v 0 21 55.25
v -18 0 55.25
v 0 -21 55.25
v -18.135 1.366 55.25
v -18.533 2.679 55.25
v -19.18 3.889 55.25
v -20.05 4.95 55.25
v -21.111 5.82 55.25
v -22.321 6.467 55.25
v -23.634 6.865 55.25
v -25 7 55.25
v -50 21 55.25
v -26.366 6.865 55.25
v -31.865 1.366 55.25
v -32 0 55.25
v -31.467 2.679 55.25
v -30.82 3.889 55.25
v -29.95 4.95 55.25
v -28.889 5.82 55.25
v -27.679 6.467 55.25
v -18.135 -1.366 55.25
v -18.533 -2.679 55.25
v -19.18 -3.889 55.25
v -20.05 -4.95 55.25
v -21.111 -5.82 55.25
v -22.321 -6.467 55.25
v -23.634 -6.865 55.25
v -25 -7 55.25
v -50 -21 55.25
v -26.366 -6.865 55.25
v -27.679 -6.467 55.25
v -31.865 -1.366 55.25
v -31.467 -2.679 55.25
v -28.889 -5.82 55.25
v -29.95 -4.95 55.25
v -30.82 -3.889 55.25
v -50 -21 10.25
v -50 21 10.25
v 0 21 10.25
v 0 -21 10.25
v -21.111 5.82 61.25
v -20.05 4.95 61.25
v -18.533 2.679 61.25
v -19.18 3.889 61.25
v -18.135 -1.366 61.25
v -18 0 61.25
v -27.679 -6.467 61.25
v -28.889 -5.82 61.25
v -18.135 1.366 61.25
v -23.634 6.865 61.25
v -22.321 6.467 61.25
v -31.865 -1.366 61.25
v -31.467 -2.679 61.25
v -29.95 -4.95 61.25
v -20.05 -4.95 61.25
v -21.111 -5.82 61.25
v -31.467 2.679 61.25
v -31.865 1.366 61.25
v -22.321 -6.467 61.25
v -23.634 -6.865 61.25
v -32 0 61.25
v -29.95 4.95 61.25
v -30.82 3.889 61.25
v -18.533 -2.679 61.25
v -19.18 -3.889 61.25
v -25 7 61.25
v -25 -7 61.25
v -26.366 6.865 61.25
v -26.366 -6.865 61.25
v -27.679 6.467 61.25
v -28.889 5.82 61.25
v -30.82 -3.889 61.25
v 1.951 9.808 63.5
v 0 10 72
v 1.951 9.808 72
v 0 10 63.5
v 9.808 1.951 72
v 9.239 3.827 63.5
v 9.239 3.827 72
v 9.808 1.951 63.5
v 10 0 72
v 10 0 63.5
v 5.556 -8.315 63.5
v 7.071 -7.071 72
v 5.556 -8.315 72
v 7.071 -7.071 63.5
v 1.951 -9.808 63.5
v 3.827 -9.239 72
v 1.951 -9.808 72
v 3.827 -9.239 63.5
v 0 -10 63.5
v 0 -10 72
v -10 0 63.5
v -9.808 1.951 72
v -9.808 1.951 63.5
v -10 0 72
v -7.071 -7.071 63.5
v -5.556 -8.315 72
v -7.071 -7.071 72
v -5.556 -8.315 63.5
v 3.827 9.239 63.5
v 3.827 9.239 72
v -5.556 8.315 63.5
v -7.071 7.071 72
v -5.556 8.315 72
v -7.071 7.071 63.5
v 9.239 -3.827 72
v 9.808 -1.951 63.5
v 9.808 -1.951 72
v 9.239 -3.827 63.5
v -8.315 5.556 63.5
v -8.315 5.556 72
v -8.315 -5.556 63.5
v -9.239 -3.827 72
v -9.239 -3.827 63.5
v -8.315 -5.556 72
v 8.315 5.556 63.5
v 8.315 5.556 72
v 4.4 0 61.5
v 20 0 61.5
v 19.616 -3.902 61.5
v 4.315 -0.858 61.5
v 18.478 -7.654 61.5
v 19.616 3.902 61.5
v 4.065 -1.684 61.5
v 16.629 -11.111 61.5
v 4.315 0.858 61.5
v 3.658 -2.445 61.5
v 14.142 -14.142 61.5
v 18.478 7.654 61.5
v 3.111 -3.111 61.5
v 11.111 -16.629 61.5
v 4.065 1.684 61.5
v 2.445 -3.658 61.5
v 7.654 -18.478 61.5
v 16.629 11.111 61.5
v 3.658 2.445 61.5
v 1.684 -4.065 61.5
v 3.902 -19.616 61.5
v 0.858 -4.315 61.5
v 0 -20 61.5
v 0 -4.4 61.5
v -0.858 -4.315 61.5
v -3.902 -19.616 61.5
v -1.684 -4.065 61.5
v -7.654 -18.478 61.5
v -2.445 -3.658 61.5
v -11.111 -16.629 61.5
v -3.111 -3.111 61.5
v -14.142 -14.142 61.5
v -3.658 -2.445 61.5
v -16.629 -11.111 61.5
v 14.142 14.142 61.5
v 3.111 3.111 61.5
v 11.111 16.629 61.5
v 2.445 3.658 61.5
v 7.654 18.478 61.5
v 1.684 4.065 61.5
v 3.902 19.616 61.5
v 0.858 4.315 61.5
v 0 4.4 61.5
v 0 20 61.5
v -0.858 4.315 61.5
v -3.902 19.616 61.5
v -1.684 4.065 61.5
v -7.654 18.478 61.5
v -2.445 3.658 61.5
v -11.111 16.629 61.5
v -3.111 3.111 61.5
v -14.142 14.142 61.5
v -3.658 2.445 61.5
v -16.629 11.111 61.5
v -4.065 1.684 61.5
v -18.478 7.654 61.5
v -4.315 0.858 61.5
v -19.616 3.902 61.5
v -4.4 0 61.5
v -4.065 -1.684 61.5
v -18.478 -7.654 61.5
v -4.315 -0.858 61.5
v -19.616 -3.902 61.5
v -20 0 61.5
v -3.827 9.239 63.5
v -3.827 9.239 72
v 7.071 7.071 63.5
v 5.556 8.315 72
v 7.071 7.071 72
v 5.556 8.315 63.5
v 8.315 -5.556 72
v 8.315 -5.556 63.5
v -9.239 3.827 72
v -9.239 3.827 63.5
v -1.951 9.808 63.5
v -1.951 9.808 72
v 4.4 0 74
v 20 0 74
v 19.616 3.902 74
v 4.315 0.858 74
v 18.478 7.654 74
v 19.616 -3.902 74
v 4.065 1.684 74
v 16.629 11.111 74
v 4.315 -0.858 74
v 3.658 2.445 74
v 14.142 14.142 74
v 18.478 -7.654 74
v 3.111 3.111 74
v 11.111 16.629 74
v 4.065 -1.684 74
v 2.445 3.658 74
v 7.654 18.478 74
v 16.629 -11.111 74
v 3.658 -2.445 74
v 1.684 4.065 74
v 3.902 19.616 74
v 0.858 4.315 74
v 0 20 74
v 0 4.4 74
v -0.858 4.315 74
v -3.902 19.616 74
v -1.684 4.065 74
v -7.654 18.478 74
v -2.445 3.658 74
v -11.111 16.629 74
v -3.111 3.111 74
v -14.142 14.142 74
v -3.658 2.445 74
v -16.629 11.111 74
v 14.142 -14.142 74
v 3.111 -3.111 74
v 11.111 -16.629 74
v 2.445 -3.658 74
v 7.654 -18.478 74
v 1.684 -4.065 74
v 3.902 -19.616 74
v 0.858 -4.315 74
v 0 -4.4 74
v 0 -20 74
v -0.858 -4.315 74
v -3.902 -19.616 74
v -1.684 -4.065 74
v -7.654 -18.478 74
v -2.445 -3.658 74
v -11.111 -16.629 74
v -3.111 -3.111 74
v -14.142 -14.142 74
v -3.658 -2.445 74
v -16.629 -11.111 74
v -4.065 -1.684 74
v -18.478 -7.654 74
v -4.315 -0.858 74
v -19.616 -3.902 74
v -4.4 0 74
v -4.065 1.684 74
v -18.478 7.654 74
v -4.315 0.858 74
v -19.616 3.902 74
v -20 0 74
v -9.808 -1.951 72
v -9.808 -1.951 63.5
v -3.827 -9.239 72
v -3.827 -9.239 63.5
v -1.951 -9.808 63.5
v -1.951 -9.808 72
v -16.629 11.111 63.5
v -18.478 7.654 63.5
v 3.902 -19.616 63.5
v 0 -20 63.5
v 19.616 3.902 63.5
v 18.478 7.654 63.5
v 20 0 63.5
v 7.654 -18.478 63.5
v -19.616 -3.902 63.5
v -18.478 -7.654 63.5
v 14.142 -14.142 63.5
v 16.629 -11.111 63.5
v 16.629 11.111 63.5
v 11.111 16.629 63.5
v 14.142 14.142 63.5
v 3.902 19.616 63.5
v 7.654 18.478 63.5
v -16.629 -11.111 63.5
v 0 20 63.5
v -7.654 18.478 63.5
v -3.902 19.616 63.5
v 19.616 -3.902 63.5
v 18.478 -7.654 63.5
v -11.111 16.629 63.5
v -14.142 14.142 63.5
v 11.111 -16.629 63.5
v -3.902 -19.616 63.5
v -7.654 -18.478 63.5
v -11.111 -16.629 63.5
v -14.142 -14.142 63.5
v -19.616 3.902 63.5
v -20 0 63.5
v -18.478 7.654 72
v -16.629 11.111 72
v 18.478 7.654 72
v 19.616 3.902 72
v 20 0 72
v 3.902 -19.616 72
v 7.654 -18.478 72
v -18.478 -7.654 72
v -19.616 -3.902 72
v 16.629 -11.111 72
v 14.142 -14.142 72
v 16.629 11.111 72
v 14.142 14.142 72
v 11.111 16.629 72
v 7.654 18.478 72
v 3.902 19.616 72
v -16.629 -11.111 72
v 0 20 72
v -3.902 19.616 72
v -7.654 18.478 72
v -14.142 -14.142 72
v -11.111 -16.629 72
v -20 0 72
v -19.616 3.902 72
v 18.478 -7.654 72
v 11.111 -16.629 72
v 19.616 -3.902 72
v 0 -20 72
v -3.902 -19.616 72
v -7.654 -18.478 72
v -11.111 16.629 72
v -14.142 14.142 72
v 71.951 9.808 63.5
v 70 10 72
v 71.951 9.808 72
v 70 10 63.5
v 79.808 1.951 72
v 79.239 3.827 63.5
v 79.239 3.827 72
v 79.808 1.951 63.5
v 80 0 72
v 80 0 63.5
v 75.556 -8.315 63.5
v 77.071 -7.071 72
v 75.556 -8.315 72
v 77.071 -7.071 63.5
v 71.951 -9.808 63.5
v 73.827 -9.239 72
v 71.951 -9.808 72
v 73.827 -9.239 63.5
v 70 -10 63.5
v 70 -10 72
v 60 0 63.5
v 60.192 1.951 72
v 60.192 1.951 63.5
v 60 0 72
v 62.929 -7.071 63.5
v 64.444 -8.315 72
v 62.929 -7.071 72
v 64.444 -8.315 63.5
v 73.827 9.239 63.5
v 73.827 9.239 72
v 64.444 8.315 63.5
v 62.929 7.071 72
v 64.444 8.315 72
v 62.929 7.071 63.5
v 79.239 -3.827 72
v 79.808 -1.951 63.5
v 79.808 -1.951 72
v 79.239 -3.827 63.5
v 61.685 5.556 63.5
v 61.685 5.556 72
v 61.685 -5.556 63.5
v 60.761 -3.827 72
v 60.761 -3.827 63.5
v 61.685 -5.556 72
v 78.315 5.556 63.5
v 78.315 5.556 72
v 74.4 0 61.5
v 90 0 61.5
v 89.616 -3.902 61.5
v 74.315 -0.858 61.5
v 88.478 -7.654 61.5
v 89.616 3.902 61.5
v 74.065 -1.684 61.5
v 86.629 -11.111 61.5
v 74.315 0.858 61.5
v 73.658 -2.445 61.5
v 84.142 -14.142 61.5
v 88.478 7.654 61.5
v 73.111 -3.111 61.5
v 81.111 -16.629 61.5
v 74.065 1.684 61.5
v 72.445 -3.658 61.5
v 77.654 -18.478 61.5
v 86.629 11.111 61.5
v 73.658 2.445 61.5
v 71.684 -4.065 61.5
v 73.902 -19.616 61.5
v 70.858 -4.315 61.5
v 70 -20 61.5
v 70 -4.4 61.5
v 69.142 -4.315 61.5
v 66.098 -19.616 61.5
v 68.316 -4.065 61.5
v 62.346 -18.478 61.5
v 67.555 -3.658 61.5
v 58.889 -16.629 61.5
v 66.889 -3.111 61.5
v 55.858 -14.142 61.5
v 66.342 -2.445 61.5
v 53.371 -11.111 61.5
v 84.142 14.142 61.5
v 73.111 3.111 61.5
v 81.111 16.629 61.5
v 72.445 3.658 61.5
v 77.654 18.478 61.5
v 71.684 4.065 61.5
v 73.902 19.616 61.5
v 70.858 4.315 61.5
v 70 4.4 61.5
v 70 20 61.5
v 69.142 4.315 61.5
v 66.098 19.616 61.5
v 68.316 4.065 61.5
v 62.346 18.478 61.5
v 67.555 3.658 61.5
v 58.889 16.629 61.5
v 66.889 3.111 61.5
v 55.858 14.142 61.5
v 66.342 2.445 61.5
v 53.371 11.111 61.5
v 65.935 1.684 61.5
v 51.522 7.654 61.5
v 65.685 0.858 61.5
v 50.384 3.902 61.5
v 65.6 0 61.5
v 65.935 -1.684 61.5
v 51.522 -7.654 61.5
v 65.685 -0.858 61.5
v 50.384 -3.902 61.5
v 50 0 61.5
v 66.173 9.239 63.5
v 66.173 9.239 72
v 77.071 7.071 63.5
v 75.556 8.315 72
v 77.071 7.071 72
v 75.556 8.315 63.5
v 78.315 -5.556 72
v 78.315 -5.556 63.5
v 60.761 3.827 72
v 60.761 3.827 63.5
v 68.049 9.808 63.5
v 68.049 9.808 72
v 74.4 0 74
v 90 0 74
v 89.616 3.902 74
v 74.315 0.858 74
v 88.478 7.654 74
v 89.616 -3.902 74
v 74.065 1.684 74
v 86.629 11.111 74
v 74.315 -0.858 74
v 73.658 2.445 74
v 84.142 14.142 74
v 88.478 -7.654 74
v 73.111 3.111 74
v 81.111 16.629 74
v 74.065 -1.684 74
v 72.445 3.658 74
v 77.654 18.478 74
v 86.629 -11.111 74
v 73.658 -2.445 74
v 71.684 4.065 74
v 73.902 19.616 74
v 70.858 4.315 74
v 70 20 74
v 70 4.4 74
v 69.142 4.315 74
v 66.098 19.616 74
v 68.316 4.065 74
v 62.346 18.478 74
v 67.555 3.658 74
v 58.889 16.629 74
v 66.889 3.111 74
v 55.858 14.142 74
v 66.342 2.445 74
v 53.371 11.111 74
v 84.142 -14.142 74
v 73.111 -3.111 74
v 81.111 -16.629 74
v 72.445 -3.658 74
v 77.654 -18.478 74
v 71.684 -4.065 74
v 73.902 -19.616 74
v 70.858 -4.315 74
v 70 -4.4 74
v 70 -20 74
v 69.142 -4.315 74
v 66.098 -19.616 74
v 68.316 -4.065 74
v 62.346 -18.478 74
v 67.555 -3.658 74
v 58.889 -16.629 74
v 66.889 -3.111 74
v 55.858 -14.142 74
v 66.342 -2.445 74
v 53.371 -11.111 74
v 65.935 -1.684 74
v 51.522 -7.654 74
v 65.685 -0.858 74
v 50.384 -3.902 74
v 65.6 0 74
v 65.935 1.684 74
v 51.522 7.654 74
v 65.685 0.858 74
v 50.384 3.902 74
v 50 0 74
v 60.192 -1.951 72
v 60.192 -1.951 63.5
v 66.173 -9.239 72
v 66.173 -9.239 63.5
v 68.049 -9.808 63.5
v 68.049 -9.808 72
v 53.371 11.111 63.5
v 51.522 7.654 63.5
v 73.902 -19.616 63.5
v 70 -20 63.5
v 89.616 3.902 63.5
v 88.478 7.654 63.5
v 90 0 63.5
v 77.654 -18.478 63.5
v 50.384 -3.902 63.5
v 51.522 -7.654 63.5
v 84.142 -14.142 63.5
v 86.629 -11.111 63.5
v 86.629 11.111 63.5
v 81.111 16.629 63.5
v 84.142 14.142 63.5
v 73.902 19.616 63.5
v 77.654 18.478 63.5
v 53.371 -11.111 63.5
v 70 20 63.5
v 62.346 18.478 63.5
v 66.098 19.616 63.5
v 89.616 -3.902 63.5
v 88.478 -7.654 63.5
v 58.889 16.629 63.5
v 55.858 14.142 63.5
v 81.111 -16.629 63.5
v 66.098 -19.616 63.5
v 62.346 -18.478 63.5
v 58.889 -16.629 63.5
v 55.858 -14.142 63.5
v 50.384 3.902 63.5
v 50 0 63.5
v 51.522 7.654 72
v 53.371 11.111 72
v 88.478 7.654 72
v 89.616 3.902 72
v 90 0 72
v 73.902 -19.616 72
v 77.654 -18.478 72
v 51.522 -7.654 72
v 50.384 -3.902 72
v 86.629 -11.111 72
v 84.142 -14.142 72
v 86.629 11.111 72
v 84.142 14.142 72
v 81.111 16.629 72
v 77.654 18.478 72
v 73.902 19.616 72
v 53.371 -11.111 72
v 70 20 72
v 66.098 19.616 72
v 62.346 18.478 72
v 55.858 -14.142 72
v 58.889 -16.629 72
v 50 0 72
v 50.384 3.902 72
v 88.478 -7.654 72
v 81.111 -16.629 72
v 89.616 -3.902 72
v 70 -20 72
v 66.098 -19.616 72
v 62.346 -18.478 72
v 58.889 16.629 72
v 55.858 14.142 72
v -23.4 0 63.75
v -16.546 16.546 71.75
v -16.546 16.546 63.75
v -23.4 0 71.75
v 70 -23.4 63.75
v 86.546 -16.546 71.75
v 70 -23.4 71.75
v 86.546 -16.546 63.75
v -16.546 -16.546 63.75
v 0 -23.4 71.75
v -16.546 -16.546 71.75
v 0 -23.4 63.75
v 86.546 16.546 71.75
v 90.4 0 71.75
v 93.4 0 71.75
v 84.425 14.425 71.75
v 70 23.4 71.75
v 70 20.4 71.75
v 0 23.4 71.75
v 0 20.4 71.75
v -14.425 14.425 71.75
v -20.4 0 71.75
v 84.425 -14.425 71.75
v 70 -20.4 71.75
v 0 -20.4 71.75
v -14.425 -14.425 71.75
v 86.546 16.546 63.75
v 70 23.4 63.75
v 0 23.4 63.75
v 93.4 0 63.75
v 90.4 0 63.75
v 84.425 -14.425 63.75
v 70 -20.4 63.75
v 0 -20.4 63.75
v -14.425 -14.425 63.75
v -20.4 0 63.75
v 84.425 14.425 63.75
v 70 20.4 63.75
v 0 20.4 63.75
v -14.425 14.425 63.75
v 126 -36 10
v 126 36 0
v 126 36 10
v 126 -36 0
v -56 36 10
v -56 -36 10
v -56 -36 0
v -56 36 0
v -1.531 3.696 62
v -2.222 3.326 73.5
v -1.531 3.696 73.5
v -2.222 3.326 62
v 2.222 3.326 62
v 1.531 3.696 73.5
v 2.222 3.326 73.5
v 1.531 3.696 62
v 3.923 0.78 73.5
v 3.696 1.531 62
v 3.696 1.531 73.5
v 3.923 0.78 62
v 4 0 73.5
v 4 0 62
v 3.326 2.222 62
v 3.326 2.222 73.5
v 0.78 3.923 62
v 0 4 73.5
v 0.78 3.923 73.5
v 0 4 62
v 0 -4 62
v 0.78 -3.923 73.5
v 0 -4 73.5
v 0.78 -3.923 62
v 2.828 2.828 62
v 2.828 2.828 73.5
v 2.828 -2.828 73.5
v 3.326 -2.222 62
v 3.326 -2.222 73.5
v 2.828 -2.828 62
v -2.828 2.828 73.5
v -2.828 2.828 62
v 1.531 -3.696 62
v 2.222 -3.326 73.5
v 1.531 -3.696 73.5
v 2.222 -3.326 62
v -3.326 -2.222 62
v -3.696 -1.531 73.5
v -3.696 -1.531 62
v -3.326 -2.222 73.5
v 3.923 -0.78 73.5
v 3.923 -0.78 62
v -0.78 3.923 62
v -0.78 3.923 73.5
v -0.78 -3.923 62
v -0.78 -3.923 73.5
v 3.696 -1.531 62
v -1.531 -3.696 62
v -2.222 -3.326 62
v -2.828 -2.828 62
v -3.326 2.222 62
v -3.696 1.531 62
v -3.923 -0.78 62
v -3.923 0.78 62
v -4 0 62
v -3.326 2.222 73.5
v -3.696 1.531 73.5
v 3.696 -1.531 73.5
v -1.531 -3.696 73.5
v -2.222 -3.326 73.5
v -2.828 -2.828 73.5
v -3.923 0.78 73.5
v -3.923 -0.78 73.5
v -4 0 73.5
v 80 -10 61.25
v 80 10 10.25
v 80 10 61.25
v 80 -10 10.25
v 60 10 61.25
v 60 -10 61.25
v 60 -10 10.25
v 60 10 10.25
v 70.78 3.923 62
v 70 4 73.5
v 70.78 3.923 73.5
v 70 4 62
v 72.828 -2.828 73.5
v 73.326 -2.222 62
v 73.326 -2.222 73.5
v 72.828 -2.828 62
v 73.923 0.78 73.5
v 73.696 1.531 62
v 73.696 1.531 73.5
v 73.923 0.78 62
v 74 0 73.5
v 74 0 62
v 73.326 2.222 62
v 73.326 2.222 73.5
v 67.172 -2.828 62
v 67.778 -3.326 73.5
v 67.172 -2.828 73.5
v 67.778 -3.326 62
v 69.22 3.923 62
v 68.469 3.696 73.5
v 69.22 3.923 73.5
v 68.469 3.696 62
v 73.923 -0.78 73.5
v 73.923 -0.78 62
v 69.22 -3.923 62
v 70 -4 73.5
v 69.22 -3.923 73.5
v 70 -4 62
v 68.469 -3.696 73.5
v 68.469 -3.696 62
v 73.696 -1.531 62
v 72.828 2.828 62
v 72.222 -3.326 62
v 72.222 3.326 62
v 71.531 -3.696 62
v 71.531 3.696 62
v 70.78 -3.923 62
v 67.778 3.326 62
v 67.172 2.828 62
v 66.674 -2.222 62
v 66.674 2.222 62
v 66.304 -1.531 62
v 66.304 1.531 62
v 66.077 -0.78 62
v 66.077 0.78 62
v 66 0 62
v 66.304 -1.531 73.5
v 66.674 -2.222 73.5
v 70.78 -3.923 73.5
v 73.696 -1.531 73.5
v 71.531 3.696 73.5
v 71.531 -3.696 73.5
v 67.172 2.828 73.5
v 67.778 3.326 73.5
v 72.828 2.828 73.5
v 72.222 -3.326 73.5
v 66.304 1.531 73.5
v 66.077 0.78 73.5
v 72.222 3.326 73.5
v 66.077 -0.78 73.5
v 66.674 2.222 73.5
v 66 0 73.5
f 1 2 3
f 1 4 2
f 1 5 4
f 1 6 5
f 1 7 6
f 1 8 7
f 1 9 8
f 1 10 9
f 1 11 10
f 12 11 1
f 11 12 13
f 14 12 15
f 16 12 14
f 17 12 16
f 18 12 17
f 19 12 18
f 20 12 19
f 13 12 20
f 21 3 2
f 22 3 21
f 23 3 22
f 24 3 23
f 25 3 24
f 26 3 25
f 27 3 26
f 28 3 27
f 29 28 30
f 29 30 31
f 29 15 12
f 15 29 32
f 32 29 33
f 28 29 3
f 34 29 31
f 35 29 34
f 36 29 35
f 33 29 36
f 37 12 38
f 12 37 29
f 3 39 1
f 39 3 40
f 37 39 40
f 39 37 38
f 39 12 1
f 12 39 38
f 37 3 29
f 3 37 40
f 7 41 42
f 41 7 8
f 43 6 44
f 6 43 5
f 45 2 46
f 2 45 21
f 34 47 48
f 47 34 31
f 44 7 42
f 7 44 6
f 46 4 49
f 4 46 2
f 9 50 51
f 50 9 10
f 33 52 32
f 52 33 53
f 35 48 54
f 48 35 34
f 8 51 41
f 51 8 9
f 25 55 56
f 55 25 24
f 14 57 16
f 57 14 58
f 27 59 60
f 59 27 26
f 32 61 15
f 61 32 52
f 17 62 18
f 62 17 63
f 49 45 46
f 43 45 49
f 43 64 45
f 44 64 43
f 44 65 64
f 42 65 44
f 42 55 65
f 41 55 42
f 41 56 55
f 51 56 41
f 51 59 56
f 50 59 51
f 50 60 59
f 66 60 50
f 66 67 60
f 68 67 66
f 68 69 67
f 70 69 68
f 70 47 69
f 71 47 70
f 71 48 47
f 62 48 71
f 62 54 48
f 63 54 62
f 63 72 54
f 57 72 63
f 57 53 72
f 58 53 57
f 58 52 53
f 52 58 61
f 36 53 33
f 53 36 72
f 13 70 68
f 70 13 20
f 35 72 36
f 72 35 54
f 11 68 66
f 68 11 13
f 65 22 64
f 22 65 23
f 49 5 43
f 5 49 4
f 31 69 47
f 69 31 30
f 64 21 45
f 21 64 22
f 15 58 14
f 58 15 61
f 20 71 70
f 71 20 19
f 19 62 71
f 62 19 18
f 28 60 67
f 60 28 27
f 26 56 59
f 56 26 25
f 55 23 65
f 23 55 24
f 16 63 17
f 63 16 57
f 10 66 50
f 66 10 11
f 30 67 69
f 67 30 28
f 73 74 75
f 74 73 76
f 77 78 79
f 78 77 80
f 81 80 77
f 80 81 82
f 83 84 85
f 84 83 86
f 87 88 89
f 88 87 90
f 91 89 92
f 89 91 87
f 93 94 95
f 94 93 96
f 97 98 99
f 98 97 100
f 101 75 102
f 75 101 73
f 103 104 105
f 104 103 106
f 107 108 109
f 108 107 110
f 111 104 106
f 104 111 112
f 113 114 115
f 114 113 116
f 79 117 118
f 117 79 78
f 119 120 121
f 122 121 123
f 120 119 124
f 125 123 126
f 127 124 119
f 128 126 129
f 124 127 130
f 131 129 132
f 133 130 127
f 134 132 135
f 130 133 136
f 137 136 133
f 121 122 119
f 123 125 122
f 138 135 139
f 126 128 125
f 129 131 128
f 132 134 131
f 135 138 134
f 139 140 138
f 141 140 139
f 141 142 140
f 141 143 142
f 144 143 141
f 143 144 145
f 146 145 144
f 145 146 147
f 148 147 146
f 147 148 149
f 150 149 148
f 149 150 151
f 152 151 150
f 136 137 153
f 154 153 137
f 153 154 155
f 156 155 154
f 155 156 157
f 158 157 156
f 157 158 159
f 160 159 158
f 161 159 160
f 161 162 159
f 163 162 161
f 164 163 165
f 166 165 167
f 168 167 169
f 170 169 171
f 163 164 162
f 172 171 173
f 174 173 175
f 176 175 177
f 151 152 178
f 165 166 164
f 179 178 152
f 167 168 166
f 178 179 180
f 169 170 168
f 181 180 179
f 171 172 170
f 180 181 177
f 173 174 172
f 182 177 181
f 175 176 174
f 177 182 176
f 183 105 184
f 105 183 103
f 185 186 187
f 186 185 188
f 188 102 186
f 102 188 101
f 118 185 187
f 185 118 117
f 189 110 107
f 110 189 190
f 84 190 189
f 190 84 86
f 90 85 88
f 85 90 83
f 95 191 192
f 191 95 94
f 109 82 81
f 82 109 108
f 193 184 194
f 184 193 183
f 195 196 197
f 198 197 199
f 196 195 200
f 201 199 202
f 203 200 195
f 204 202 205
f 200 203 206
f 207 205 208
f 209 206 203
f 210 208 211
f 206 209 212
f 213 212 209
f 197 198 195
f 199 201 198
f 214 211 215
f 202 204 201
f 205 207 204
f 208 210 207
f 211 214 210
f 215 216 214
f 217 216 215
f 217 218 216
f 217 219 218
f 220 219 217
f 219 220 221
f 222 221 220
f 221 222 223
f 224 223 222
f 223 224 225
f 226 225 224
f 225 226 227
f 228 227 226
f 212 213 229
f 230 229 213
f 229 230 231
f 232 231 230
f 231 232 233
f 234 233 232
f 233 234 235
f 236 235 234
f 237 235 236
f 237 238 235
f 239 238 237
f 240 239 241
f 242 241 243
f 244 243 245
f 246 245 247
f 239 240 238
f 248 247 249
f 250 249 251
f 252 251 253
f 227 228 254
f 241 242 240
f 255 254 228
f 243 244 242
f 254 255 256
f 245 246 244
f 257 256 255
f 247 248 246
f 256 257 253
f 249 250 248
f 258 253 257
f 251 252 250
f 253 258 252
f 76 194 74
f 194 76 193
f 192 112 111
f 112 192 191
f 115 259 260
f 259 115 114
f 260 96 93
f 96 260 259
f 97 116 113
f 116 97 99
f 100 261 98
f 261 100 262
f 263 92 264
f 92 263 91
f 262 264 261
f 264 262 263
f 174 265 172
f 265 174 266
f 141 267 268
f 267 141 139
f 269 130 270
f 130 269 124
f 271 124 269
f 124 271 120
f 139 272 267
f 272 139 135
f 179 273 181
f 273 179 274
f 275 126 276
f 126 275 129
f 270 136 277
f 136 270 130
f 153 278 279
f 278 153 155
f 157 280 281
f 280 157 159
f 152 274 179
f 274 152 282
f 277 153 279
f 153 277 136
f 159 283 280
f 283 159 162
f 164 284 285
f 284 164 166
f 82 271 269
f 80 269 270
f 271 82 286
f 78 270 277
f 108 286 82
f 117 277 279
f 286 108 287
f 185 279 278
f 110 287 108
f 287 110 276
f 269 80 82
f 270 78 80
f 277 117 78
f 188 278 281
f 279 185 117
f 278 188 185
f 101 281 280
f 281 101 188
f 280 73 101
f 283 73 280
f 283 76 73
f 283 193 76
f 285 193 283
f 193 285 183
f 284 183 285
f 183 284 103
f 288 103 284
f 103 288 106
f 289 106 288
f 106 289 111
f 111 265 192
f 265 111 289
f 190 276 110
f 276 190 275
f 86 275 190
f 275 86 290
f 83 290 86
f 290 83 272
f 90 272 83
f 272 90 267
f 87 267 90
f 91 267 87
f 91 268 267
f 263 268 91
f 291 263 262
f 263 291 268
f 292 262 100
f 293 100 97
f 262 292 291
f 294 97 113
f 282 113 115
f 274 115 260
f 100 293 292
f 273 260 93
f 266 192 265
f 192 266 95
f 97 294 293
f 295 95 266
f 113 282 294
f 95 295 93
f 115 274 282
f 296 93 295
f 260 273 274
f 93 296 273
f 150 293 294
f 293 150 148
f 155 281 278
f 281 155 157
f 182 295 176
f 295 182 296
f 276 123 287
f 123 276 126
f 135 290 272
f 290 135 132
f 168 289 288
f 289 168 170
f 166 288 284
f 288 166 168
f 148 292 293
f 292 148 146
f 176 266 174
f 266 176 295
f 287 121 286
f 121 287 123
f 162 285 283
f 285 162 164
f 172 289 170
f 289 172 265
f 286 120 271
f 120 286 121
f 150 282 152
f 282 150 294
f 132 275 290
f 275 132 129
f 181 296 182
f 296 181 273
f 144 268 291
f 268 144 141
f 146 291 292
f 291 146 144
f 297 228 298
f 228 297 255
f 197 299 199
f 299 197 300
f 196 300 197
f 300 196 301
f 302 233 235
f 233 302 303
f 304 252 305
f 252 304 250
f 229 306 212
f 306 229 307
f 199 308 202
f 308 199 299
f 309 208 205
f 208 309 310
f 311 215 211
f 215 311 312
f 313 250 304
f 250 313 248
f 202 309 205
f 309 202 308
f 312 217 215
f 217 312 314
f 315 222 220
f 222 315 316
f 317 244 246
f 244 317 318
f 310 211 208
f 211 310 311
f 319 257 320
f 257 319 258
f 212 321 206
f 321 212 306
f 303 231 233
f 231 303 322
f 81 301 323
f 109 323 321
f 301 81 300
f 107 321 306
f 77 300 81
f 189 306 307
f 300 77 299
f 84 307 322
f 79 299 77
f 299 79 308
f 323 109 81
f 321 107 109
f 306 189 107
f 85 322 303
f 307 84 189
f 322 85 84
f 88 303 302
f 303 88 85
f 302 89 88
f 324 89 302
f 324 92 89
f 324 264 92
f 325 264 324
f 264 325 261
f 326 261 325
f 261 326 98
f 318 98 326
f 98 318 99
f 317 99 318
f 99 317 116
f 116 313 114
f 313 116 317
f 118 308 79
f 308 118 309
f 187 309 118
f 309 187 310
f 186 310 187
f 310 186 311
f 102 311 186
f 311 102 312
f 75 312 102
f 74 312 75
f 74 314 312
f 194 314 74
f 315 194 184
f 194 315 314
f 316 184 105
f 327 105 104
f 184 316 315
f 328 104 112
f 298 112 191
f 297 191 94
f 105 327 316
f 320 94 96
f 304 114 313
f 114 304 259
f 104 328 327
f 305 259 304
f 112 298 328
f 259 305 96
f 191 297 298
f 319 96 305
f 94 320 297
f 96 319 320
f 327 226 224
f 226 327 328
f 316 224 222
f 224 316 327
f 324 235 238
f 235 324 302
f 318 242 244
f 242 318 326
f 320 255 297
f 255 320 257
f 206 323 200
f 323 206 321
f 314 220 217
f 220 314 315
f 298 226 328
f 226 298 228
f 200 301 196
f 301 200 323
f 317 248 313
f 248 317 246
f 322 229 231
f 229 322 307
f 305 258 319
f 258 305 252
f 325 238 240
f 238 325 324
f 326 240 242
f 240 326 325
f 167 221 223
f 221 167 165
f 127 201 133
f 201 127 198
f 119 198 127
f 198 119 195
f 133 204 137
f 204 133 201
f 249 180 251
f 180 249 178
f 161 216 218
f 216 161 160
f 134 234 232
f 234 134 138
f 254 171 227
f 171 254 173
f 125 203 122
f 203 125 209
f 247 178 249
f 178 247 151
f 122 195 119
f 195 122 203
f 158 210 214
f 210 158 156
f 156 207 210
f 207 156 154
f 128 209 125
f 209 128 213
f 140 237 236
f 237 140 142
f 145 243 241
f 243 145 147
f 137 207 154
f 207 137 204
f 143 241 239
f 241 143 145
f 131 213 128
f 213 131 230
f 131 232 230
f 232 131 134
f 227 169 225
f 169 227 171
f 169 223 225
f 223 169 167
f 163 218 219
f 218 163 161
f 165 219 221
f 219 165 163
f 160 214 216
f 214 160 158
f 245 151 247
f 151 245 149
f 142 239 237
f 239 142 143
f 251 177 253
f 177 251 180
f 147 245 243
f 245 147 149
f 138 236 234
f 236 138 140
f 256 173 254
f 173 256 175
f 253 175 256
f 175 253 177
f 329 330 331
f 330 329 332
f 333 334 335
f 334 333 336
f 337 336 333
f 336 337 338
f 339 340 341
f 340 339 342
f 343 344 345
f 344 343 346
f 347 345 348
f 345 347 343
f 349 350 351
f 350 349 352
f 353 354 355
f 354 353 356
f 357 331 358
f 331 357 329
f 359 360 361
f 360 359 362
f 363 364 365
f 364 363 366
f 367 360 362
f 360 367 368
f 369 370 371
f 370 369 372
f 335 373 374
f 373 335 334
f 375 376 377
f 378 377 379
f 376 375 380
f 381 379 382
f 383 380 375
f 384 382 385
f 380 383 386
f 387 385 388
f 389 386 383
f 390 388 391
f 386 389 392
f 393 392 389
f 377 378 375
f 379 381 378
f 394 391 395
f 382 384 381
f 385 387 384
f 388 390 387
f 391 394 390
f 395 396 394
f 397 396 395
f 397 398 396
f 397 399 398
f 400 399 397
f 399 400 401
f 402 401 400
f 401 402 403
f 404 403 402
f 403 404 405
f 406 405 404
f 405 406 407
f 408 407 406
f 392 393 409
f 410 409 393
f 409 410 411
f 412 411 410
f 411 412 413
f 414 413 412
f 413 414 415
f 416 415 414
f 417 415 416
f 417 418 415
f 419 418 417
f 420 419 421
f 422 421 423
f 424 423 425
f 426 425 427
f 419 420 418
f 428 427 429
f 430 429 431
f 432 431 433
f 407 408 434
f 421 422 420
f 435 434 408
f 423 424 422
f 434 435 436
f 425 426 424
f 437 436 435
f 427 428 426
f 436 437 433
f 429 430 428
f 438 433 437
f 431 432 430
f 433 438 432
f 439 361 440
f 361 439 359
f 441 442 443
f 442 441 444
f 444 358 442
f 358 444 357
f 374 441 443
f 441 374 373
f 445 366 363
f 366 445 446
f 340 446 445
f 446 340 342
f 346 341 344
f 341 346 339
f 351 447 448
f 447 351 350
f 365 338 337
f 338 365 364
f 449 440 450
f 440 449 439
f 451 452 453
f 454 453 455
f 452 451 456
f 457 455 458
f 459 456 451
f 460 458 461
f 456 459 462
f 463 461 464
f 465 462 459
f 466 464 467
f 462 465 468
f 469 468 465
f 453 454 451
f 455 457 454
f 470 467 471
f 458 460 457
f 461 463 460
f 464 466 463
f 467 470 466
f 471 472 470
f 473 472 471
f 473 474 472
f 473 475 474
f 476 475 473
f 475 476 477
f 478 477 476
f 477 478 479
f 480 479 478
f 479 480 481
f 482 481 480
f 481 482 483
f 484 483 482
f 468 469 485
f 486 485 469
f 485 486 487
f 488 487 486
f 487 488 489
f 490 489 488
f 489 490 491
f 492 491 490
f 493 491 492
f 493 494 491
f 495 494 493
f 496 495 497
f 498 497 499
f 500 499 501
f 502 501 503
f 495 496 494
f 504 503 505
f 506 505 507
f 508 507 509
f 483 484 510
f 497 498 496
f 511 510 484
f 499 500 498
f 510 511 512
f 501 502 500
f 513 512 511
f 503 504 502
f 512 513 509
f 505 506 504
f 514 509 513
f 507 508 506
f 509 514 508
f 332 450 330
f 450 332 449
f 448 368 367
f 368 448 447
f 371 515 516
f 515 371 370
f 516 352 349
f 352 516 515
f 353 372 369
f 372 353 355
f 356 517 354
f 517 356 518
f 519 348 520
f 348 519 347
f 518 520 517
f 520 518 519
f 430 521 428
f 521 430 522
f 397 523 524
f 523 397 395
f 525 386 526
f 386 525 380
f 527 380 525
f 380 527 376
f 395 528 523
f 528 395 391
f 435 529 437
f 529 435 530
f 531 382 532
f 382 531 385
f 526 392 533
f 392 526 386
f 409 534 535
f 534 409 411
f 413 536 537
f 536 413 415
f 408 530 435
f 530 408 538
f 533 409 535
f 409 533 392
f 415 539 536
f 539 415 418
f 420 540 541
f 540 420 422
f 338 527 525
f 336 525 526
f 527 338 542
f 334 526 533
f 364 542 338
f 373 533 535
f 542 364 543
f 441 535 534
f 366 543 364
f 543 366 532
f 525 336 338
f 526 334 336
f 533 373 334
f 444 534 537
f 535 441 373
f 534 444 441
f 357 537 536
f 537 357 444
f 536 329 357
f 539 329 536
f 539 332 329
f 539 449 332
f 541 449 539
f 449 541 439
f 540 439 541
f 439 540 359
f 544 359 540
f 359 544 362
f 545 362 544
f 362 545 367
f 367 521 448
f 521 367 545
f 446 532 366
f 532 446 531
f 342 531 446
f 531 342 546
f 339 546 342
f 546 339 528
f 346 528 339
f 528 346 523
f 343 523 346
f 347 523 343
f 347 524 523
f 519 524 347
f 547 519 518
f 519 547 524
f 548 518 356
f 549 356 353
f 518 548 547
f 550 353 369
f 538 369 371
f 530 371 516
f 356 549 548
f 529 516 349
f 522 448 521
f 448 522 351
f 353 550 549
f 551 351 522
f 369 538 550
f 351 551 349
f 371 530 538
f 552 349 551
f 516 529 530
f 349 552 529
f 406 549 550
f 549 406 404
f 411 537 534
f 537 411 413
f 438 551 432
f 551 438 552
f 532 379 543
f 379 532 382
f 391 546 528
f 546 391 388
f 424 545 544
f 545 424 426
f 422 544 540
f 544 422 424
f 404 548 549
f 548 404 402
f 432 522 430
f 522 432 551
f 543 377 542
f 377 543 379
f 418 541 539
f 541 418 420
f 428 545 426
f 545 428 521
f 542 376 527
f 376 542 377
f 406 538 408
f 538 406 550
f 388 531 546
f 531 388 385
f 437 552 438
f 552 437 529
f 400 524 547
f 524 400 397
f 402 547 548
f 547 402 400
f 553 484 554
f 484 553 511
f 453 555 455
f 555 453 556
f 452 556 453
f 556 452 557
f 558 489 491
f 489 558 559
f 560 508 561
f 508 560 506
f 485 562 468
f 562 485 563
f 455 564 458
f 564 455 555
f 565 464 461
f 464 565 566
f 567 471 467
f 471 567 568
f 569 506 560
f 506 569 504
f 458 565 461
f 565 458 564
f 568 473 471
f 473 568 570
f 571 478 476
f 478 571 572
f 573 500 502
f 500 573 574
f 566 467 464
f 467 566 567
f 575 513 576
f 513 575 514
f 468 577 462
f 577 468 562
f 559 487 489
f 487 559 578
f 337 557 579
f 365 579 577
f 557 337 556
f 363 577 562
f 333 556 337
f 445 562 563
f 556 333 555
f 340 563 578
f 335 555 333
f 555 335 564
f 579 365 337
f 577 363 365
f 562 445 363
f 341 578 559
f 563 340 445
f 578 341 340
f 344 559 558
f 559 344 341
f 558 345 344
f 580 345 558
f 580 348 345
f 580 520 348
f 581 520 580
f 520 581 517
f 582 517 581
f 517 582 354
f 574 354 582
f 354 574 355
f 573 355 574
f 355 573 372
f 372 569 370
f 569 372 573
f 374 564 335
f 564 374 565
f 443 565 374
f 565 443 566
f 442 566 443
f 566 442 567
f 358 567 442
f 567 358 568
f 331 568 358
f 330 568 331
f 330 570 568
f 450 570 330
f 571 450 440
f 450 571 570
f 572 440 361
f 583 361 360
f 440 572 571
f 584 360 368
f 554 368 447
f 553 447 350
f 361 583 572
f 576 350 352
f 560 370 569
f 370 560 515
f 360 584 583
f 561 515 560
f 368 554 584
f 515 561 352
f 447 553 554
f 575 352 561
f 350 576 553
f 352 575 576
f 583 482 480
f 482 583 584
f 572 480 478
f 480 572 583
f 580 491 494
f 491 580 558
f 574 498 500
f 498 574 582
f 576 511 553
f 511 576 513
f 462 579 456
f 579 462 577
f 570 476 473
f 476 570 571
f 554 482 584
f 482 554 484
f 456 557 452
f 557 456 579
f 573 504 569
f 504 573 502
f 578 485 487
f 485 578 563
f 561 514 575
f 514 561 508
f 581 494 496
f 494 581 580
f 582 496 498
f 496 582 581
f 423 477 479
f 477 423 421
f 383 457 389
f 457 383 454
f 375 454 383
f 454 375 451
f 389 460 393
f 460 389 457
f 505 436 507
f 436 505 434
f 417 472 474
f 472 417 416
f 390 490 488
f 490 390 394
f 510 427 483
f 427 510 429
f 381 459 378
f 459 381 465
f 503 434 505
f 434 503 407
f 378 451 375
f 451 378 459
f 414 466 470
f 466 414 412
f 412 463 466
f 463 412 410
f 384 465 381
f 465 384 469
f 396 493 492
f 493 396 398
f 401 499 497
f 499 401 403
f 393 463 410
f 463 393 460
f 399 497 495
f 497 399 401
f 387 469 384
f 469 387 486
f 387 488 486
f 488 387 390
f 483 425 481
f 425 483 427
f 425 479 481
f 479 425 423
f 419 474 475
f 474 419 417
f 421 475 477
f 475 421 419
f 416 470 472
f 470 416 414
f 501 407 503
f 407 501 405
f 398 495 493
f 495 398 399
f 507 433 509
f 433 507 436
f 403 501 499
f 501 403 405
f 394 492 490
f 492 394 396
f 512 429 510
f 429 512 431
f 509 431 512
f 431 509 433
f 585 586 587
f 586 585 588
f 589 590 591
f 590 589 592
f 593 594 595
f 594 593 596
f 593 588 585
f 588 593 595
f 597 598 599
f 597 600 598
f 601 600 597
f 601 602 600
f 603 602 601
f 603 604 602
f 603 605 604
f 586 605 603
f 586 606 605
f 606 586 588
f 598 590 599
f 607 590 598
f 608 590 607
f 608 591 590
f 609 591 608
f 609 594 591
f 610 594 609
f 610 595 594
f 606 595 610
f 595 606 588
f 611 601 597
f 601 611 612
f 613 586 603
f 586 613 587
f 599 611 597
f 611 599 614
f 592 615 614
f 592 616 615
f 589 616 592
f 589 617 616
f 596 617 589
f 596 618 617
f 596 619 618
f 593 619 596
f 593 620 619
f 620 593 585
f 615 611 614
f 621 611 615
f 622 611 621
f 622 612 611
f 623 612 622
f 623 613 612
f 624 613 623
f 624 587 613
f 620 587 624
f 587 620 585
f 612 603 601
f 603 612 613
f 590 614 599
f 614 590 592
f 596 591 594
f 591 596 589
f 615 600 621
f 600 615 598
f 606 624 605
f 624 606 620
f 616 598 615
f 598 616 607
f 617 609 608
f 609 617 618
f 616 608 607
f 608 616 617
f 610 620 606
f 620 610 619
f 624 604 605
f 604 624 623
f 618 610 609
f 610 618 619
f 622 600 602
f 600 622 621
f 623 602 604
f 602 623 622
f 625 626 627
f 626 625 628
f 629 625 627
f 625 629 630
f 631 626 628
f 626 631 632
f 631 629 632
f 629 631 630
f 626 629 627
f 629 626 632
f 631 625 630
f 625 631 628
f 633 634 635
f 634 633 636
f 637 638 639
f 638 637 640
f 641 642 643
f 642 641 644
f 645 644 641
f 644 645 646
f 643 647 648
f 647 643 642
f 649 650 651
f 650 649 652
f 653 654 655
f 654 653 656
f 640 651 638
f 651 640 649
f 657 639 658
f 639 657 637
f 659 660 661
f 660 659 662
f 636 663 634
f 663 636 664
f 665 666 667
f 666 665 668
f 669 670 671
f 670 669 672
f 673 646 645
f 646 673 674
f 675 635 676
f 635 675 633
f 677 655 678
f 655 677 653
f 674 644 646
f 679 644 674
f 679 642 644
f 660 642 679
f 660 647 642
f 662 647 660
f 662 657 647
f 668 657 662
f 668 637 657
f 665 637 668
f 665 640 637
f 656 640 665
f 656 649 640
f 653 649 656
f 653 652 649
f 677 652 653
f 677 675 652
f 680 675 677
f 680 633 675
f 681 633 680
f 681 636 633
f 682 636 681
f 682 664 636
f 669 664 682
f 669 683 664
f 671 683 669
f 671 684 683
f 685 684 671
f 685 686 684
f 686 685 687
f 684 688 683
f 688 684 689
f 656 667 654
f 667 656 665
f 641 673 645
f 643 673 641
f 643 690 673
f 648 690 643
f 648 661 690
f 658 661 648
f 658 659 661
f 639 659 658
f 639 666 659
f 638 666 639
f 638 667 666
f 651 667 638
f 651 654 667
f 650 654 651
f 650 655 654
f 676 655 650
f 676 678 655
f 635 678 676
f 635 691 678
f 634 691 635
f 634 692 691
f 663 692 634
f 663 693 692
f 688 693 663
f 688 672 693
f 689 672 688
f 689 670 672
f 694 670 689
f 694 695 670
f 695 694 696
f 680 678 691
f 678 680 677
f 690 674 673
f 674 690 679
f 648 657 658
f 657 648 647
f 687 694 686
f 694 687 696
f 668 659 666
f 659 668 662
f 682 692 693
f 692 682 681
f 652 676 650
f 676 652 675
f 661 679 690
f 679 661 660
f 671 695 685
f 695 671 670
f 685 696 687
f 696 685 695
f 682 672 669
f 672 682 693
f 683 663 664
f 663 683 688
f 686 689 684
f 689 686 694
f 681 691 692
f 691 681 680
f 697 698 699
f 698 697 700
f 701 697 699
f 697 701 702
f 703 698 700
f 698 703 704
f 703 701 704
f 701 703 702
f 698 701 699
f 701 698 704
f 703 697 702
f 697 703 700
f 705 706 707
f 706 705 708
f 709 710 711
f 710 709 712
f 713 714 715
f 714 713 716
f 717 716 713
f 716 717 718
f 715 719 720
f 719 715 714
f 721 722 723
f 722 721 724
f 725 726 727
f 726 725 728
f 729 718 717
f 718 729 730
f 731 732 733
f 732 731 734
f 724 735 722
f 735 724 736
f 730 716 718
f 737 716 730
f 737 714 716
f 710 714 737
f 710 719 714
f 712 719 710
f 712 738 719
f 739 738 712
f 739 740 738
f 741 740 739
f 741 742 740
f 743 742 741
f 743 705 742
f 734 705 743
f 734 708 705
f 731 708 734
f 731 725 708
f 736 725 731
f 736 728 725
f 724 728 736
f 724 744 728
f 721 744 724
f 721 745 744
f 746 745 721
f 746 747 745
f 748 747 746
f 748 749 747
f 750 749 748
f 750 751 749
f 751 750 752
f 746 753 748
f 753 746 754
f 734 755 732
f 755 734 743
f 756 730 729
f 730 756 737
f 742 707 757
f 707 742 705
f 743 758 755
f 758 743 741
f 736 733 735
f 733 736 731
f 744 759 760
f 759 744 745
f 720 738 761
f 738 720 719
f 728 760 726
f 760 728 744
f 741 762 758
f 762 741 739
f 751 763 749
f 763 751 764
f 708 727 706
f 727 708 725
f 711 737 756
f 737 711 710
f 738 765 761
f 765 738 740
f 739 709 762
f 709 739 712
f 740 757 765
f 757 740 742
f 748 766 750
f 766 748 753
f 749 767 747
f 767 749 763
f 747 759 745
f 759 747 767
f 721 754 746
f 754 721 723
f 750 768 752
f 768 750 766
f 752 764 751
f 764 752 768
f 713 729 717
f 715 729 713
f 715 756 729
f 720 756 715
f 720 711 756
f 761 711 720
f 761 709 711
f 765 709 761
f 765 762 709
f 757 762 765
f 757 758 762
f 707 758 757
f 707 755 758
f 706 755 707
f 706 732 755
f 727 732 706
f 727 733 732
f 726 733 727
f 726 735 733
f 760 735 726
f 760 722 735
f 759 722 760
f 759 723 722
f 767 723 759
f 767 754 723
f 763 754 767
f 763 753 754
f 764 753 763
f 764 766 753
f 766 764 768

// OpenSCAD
$fn = 32;

// ------------------------------------------------------------------------
// Motor belt drive: span 70 mm, pulleys d40, belt 8 mm wide
// Every part is its own module, assembly() places every instance.
// ------------------------------------------------------------------------

// --- part 1 ---
module base_plate() {
  difference() {
    translate([-91, -36, 0]) cube([182, 72, 10]);
  }
}

// --- part 2 ---
module motor() {
  union() {
    translate([-22.5, -21, 0]) cube([45, 42, 50]);
    translate([25.5, 0, 25]) rotate([0, 90, 0]) cylinder(h = 6, d = 14, center = true);
  }
}

// --- part 3 ---
module drive_shaft() {
  translate([0, 0, -5.75]) cylinder(h = 11.5, d = 8);
}

// --- part 4 ---
module pulley_drive() {
  difference() {
    union() {
      cylinder(h = 12.5, d = 20);
      cylinder(h = 2, d = 40);
      translate([0, 0, 10.5]) cylinder(h = 2, d = 40);
    }
    translate([0, 0, -1]) cylinder(h = 14.5, d = 8.8);
  }
}

// --- part 5 ---
module idler_post() {
  translate([-10, -10, 0]) cube([20, 20, 51]);
}

// --- part 6 ---
module driven_shaft() {
  translate([0, 0, -5.75]) cylinder(h = 11.5, d = 8);
}

// --- part 7 ---
module pulley_driven() {
  difference() {
    union() {
      cylinder(h = 12.5, d = 20);
      cylinder(h = 2, d = 40);
      translate([0, 0, 10.5]) cylinder(h = 2, d = 40);
    }
    translate([0, 0, -1]) cylinder(h = 14.5, d = 8.8);
  }
}

// --- part 8 ---
module drive_belt() {
  difference() {
    linear_extrude(height = 8) polygon(points = concat([for (a = [90 : 45 : 270]) [23.4 * cos(a), 23.4 * sin(a)]], [for (a = [270 : 45 : 450]) [70 + 23.4 * cos(a), 23.4 * sin(a)]]));
    translate([0, 0, -1]) linear_extrude(height = 10) polygon(points = concat([for (a = [90 : 45 : 270]) [20.4 * cos(a), 20.4 * sin(a)]], [for (a = [270 : 45 : 450]) [70 + 20.4 * cos(a), 20.4 * sin(a)]]));
  }
}

// --- assembly ---
module assembly() {
  color([0.80, 0.24, 0.20]) translate([35, 0, 0]) rotate([0, 0, 0]) base_plate();
  color([0.20, 0.45, 0.75]) translate([0, 0, 32.75]) rotate([0, 270, 0]) motor();
  color([0.25, 0.62, 0.32]) translate([0, 0, 67.75]) rotate([0, 0, 0]) drive_shaft();
  color([0.92, 0.70, 0.18]) translate([0, 0, 61.5]) rotate([0, 0, 0]) pulley_drive();
  color([0.58, 0.35, 0.70]) translate([70, 0, 10.25]) rotate([0, 0, 0]) idler_post();
  color([0.16, 0.66, 0.66]) translate([70, 0, 67.75]) rotate([0, 0, 0]) driven_shaft();
  color([0.85, 0.48, 0.18]) translate([70, 0, 61.5]) rotate([0, 0, 0]) pulley_driven();
  color([0.55, 0.60, 0.65]) translate([0, 0, 63.75]) rotate([0, 0, 0]) drive_belt();
}

assembly();
